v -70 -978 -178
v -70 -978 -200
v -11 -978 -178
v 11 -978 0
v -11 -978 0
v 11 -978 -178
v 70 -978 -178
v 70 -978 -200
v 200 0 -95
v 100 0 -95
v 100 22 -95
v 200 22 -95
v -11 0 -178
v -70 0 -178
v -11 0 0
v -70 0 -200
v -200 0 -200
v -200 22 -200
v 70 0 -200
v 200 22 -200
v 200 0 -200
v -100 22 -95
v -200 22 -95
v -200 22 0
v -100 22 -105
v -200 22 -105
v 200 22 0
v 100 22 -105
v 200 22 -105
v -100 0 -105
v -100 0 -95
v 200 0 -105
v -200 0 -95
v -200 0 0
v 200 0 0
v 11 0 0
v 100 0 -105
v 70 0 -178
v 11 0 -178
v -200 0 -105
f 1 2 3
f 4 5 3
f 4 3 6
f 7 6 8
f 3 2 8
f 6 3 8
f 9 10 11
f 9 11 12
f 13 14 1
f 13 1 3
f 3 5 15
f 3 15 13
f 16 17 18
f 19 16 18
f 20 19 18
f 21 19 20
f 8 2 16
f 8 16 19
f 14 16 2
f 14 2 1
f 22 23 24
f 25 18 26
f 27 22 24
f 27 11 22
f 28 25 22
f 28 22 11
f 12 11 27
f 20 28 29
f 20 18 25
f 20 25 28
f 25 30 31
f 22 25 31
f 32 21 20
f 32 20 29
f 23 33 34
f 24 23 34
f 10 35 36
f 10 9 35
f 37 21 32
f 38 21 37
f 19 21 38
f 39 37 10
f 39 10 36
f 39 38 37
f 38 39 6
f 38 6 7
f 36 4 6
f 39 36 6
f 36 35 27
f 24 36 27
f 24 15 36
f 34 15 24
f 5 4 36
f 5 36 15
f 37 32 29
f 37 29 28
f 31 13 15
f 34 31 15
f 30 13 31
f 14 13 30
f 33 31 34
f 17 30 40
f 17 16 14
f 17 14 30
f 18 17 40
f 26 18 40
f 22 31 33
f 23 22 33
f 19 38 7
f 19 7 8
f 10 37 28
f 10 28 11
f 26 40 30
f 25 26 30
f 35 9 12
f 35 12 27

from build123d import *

# Parameters (mm, degrees)
BOSS_EXTRU_1_DEPTH = 22
ESQUISSE3_W        = 22
ESQUISSE3_H        = 178
BOSS_EXTRU_2_DEPTH = 1000


with BuildPart() as part:
    # Esquisse2 → Boss.-Extru.1 (new body)
    with BuildSketch(Plane(origin=(0, 0, 0), x_dir=(1, 0, 0), z_dir=(0, 1, 0))):
        Polygon((-200, 0), (0, 0), (0, 200), (-200, 200), (-200, 105), (-100, 105), (-100, 95), (-200, 95), align=None)
    boss_extru_1 = extrude(amount=BOSS_EXTRU_1_DEPTH)

    # Symétrie1: Boss.-Extru.1 across plane
    add(boss_extru_1.mirror(Plane(origin=(0, 22, 0), x_dir=(0, 0, 1), z_dir=(-1, 0, 0))))

    # Esquisse3 → Boss.-Extru.2 (add)
    with BuildSketch(Plane(origin=(0, 22, 0), x_dir=(1, 0, 0), z_dir=(0, 1, 0))):
        Polygon((70, 200), (-70, 200), (-70, 178), (-11, 178), (11, 178), (70, 178), align=None)
        with Locations((0, 89)):
            Rectangle(ESQUISSE3_W, ESQUISSE3_H)
    extrude(amount=-BOSS_EXTRU_2_DEPTH)


solid = part.part
